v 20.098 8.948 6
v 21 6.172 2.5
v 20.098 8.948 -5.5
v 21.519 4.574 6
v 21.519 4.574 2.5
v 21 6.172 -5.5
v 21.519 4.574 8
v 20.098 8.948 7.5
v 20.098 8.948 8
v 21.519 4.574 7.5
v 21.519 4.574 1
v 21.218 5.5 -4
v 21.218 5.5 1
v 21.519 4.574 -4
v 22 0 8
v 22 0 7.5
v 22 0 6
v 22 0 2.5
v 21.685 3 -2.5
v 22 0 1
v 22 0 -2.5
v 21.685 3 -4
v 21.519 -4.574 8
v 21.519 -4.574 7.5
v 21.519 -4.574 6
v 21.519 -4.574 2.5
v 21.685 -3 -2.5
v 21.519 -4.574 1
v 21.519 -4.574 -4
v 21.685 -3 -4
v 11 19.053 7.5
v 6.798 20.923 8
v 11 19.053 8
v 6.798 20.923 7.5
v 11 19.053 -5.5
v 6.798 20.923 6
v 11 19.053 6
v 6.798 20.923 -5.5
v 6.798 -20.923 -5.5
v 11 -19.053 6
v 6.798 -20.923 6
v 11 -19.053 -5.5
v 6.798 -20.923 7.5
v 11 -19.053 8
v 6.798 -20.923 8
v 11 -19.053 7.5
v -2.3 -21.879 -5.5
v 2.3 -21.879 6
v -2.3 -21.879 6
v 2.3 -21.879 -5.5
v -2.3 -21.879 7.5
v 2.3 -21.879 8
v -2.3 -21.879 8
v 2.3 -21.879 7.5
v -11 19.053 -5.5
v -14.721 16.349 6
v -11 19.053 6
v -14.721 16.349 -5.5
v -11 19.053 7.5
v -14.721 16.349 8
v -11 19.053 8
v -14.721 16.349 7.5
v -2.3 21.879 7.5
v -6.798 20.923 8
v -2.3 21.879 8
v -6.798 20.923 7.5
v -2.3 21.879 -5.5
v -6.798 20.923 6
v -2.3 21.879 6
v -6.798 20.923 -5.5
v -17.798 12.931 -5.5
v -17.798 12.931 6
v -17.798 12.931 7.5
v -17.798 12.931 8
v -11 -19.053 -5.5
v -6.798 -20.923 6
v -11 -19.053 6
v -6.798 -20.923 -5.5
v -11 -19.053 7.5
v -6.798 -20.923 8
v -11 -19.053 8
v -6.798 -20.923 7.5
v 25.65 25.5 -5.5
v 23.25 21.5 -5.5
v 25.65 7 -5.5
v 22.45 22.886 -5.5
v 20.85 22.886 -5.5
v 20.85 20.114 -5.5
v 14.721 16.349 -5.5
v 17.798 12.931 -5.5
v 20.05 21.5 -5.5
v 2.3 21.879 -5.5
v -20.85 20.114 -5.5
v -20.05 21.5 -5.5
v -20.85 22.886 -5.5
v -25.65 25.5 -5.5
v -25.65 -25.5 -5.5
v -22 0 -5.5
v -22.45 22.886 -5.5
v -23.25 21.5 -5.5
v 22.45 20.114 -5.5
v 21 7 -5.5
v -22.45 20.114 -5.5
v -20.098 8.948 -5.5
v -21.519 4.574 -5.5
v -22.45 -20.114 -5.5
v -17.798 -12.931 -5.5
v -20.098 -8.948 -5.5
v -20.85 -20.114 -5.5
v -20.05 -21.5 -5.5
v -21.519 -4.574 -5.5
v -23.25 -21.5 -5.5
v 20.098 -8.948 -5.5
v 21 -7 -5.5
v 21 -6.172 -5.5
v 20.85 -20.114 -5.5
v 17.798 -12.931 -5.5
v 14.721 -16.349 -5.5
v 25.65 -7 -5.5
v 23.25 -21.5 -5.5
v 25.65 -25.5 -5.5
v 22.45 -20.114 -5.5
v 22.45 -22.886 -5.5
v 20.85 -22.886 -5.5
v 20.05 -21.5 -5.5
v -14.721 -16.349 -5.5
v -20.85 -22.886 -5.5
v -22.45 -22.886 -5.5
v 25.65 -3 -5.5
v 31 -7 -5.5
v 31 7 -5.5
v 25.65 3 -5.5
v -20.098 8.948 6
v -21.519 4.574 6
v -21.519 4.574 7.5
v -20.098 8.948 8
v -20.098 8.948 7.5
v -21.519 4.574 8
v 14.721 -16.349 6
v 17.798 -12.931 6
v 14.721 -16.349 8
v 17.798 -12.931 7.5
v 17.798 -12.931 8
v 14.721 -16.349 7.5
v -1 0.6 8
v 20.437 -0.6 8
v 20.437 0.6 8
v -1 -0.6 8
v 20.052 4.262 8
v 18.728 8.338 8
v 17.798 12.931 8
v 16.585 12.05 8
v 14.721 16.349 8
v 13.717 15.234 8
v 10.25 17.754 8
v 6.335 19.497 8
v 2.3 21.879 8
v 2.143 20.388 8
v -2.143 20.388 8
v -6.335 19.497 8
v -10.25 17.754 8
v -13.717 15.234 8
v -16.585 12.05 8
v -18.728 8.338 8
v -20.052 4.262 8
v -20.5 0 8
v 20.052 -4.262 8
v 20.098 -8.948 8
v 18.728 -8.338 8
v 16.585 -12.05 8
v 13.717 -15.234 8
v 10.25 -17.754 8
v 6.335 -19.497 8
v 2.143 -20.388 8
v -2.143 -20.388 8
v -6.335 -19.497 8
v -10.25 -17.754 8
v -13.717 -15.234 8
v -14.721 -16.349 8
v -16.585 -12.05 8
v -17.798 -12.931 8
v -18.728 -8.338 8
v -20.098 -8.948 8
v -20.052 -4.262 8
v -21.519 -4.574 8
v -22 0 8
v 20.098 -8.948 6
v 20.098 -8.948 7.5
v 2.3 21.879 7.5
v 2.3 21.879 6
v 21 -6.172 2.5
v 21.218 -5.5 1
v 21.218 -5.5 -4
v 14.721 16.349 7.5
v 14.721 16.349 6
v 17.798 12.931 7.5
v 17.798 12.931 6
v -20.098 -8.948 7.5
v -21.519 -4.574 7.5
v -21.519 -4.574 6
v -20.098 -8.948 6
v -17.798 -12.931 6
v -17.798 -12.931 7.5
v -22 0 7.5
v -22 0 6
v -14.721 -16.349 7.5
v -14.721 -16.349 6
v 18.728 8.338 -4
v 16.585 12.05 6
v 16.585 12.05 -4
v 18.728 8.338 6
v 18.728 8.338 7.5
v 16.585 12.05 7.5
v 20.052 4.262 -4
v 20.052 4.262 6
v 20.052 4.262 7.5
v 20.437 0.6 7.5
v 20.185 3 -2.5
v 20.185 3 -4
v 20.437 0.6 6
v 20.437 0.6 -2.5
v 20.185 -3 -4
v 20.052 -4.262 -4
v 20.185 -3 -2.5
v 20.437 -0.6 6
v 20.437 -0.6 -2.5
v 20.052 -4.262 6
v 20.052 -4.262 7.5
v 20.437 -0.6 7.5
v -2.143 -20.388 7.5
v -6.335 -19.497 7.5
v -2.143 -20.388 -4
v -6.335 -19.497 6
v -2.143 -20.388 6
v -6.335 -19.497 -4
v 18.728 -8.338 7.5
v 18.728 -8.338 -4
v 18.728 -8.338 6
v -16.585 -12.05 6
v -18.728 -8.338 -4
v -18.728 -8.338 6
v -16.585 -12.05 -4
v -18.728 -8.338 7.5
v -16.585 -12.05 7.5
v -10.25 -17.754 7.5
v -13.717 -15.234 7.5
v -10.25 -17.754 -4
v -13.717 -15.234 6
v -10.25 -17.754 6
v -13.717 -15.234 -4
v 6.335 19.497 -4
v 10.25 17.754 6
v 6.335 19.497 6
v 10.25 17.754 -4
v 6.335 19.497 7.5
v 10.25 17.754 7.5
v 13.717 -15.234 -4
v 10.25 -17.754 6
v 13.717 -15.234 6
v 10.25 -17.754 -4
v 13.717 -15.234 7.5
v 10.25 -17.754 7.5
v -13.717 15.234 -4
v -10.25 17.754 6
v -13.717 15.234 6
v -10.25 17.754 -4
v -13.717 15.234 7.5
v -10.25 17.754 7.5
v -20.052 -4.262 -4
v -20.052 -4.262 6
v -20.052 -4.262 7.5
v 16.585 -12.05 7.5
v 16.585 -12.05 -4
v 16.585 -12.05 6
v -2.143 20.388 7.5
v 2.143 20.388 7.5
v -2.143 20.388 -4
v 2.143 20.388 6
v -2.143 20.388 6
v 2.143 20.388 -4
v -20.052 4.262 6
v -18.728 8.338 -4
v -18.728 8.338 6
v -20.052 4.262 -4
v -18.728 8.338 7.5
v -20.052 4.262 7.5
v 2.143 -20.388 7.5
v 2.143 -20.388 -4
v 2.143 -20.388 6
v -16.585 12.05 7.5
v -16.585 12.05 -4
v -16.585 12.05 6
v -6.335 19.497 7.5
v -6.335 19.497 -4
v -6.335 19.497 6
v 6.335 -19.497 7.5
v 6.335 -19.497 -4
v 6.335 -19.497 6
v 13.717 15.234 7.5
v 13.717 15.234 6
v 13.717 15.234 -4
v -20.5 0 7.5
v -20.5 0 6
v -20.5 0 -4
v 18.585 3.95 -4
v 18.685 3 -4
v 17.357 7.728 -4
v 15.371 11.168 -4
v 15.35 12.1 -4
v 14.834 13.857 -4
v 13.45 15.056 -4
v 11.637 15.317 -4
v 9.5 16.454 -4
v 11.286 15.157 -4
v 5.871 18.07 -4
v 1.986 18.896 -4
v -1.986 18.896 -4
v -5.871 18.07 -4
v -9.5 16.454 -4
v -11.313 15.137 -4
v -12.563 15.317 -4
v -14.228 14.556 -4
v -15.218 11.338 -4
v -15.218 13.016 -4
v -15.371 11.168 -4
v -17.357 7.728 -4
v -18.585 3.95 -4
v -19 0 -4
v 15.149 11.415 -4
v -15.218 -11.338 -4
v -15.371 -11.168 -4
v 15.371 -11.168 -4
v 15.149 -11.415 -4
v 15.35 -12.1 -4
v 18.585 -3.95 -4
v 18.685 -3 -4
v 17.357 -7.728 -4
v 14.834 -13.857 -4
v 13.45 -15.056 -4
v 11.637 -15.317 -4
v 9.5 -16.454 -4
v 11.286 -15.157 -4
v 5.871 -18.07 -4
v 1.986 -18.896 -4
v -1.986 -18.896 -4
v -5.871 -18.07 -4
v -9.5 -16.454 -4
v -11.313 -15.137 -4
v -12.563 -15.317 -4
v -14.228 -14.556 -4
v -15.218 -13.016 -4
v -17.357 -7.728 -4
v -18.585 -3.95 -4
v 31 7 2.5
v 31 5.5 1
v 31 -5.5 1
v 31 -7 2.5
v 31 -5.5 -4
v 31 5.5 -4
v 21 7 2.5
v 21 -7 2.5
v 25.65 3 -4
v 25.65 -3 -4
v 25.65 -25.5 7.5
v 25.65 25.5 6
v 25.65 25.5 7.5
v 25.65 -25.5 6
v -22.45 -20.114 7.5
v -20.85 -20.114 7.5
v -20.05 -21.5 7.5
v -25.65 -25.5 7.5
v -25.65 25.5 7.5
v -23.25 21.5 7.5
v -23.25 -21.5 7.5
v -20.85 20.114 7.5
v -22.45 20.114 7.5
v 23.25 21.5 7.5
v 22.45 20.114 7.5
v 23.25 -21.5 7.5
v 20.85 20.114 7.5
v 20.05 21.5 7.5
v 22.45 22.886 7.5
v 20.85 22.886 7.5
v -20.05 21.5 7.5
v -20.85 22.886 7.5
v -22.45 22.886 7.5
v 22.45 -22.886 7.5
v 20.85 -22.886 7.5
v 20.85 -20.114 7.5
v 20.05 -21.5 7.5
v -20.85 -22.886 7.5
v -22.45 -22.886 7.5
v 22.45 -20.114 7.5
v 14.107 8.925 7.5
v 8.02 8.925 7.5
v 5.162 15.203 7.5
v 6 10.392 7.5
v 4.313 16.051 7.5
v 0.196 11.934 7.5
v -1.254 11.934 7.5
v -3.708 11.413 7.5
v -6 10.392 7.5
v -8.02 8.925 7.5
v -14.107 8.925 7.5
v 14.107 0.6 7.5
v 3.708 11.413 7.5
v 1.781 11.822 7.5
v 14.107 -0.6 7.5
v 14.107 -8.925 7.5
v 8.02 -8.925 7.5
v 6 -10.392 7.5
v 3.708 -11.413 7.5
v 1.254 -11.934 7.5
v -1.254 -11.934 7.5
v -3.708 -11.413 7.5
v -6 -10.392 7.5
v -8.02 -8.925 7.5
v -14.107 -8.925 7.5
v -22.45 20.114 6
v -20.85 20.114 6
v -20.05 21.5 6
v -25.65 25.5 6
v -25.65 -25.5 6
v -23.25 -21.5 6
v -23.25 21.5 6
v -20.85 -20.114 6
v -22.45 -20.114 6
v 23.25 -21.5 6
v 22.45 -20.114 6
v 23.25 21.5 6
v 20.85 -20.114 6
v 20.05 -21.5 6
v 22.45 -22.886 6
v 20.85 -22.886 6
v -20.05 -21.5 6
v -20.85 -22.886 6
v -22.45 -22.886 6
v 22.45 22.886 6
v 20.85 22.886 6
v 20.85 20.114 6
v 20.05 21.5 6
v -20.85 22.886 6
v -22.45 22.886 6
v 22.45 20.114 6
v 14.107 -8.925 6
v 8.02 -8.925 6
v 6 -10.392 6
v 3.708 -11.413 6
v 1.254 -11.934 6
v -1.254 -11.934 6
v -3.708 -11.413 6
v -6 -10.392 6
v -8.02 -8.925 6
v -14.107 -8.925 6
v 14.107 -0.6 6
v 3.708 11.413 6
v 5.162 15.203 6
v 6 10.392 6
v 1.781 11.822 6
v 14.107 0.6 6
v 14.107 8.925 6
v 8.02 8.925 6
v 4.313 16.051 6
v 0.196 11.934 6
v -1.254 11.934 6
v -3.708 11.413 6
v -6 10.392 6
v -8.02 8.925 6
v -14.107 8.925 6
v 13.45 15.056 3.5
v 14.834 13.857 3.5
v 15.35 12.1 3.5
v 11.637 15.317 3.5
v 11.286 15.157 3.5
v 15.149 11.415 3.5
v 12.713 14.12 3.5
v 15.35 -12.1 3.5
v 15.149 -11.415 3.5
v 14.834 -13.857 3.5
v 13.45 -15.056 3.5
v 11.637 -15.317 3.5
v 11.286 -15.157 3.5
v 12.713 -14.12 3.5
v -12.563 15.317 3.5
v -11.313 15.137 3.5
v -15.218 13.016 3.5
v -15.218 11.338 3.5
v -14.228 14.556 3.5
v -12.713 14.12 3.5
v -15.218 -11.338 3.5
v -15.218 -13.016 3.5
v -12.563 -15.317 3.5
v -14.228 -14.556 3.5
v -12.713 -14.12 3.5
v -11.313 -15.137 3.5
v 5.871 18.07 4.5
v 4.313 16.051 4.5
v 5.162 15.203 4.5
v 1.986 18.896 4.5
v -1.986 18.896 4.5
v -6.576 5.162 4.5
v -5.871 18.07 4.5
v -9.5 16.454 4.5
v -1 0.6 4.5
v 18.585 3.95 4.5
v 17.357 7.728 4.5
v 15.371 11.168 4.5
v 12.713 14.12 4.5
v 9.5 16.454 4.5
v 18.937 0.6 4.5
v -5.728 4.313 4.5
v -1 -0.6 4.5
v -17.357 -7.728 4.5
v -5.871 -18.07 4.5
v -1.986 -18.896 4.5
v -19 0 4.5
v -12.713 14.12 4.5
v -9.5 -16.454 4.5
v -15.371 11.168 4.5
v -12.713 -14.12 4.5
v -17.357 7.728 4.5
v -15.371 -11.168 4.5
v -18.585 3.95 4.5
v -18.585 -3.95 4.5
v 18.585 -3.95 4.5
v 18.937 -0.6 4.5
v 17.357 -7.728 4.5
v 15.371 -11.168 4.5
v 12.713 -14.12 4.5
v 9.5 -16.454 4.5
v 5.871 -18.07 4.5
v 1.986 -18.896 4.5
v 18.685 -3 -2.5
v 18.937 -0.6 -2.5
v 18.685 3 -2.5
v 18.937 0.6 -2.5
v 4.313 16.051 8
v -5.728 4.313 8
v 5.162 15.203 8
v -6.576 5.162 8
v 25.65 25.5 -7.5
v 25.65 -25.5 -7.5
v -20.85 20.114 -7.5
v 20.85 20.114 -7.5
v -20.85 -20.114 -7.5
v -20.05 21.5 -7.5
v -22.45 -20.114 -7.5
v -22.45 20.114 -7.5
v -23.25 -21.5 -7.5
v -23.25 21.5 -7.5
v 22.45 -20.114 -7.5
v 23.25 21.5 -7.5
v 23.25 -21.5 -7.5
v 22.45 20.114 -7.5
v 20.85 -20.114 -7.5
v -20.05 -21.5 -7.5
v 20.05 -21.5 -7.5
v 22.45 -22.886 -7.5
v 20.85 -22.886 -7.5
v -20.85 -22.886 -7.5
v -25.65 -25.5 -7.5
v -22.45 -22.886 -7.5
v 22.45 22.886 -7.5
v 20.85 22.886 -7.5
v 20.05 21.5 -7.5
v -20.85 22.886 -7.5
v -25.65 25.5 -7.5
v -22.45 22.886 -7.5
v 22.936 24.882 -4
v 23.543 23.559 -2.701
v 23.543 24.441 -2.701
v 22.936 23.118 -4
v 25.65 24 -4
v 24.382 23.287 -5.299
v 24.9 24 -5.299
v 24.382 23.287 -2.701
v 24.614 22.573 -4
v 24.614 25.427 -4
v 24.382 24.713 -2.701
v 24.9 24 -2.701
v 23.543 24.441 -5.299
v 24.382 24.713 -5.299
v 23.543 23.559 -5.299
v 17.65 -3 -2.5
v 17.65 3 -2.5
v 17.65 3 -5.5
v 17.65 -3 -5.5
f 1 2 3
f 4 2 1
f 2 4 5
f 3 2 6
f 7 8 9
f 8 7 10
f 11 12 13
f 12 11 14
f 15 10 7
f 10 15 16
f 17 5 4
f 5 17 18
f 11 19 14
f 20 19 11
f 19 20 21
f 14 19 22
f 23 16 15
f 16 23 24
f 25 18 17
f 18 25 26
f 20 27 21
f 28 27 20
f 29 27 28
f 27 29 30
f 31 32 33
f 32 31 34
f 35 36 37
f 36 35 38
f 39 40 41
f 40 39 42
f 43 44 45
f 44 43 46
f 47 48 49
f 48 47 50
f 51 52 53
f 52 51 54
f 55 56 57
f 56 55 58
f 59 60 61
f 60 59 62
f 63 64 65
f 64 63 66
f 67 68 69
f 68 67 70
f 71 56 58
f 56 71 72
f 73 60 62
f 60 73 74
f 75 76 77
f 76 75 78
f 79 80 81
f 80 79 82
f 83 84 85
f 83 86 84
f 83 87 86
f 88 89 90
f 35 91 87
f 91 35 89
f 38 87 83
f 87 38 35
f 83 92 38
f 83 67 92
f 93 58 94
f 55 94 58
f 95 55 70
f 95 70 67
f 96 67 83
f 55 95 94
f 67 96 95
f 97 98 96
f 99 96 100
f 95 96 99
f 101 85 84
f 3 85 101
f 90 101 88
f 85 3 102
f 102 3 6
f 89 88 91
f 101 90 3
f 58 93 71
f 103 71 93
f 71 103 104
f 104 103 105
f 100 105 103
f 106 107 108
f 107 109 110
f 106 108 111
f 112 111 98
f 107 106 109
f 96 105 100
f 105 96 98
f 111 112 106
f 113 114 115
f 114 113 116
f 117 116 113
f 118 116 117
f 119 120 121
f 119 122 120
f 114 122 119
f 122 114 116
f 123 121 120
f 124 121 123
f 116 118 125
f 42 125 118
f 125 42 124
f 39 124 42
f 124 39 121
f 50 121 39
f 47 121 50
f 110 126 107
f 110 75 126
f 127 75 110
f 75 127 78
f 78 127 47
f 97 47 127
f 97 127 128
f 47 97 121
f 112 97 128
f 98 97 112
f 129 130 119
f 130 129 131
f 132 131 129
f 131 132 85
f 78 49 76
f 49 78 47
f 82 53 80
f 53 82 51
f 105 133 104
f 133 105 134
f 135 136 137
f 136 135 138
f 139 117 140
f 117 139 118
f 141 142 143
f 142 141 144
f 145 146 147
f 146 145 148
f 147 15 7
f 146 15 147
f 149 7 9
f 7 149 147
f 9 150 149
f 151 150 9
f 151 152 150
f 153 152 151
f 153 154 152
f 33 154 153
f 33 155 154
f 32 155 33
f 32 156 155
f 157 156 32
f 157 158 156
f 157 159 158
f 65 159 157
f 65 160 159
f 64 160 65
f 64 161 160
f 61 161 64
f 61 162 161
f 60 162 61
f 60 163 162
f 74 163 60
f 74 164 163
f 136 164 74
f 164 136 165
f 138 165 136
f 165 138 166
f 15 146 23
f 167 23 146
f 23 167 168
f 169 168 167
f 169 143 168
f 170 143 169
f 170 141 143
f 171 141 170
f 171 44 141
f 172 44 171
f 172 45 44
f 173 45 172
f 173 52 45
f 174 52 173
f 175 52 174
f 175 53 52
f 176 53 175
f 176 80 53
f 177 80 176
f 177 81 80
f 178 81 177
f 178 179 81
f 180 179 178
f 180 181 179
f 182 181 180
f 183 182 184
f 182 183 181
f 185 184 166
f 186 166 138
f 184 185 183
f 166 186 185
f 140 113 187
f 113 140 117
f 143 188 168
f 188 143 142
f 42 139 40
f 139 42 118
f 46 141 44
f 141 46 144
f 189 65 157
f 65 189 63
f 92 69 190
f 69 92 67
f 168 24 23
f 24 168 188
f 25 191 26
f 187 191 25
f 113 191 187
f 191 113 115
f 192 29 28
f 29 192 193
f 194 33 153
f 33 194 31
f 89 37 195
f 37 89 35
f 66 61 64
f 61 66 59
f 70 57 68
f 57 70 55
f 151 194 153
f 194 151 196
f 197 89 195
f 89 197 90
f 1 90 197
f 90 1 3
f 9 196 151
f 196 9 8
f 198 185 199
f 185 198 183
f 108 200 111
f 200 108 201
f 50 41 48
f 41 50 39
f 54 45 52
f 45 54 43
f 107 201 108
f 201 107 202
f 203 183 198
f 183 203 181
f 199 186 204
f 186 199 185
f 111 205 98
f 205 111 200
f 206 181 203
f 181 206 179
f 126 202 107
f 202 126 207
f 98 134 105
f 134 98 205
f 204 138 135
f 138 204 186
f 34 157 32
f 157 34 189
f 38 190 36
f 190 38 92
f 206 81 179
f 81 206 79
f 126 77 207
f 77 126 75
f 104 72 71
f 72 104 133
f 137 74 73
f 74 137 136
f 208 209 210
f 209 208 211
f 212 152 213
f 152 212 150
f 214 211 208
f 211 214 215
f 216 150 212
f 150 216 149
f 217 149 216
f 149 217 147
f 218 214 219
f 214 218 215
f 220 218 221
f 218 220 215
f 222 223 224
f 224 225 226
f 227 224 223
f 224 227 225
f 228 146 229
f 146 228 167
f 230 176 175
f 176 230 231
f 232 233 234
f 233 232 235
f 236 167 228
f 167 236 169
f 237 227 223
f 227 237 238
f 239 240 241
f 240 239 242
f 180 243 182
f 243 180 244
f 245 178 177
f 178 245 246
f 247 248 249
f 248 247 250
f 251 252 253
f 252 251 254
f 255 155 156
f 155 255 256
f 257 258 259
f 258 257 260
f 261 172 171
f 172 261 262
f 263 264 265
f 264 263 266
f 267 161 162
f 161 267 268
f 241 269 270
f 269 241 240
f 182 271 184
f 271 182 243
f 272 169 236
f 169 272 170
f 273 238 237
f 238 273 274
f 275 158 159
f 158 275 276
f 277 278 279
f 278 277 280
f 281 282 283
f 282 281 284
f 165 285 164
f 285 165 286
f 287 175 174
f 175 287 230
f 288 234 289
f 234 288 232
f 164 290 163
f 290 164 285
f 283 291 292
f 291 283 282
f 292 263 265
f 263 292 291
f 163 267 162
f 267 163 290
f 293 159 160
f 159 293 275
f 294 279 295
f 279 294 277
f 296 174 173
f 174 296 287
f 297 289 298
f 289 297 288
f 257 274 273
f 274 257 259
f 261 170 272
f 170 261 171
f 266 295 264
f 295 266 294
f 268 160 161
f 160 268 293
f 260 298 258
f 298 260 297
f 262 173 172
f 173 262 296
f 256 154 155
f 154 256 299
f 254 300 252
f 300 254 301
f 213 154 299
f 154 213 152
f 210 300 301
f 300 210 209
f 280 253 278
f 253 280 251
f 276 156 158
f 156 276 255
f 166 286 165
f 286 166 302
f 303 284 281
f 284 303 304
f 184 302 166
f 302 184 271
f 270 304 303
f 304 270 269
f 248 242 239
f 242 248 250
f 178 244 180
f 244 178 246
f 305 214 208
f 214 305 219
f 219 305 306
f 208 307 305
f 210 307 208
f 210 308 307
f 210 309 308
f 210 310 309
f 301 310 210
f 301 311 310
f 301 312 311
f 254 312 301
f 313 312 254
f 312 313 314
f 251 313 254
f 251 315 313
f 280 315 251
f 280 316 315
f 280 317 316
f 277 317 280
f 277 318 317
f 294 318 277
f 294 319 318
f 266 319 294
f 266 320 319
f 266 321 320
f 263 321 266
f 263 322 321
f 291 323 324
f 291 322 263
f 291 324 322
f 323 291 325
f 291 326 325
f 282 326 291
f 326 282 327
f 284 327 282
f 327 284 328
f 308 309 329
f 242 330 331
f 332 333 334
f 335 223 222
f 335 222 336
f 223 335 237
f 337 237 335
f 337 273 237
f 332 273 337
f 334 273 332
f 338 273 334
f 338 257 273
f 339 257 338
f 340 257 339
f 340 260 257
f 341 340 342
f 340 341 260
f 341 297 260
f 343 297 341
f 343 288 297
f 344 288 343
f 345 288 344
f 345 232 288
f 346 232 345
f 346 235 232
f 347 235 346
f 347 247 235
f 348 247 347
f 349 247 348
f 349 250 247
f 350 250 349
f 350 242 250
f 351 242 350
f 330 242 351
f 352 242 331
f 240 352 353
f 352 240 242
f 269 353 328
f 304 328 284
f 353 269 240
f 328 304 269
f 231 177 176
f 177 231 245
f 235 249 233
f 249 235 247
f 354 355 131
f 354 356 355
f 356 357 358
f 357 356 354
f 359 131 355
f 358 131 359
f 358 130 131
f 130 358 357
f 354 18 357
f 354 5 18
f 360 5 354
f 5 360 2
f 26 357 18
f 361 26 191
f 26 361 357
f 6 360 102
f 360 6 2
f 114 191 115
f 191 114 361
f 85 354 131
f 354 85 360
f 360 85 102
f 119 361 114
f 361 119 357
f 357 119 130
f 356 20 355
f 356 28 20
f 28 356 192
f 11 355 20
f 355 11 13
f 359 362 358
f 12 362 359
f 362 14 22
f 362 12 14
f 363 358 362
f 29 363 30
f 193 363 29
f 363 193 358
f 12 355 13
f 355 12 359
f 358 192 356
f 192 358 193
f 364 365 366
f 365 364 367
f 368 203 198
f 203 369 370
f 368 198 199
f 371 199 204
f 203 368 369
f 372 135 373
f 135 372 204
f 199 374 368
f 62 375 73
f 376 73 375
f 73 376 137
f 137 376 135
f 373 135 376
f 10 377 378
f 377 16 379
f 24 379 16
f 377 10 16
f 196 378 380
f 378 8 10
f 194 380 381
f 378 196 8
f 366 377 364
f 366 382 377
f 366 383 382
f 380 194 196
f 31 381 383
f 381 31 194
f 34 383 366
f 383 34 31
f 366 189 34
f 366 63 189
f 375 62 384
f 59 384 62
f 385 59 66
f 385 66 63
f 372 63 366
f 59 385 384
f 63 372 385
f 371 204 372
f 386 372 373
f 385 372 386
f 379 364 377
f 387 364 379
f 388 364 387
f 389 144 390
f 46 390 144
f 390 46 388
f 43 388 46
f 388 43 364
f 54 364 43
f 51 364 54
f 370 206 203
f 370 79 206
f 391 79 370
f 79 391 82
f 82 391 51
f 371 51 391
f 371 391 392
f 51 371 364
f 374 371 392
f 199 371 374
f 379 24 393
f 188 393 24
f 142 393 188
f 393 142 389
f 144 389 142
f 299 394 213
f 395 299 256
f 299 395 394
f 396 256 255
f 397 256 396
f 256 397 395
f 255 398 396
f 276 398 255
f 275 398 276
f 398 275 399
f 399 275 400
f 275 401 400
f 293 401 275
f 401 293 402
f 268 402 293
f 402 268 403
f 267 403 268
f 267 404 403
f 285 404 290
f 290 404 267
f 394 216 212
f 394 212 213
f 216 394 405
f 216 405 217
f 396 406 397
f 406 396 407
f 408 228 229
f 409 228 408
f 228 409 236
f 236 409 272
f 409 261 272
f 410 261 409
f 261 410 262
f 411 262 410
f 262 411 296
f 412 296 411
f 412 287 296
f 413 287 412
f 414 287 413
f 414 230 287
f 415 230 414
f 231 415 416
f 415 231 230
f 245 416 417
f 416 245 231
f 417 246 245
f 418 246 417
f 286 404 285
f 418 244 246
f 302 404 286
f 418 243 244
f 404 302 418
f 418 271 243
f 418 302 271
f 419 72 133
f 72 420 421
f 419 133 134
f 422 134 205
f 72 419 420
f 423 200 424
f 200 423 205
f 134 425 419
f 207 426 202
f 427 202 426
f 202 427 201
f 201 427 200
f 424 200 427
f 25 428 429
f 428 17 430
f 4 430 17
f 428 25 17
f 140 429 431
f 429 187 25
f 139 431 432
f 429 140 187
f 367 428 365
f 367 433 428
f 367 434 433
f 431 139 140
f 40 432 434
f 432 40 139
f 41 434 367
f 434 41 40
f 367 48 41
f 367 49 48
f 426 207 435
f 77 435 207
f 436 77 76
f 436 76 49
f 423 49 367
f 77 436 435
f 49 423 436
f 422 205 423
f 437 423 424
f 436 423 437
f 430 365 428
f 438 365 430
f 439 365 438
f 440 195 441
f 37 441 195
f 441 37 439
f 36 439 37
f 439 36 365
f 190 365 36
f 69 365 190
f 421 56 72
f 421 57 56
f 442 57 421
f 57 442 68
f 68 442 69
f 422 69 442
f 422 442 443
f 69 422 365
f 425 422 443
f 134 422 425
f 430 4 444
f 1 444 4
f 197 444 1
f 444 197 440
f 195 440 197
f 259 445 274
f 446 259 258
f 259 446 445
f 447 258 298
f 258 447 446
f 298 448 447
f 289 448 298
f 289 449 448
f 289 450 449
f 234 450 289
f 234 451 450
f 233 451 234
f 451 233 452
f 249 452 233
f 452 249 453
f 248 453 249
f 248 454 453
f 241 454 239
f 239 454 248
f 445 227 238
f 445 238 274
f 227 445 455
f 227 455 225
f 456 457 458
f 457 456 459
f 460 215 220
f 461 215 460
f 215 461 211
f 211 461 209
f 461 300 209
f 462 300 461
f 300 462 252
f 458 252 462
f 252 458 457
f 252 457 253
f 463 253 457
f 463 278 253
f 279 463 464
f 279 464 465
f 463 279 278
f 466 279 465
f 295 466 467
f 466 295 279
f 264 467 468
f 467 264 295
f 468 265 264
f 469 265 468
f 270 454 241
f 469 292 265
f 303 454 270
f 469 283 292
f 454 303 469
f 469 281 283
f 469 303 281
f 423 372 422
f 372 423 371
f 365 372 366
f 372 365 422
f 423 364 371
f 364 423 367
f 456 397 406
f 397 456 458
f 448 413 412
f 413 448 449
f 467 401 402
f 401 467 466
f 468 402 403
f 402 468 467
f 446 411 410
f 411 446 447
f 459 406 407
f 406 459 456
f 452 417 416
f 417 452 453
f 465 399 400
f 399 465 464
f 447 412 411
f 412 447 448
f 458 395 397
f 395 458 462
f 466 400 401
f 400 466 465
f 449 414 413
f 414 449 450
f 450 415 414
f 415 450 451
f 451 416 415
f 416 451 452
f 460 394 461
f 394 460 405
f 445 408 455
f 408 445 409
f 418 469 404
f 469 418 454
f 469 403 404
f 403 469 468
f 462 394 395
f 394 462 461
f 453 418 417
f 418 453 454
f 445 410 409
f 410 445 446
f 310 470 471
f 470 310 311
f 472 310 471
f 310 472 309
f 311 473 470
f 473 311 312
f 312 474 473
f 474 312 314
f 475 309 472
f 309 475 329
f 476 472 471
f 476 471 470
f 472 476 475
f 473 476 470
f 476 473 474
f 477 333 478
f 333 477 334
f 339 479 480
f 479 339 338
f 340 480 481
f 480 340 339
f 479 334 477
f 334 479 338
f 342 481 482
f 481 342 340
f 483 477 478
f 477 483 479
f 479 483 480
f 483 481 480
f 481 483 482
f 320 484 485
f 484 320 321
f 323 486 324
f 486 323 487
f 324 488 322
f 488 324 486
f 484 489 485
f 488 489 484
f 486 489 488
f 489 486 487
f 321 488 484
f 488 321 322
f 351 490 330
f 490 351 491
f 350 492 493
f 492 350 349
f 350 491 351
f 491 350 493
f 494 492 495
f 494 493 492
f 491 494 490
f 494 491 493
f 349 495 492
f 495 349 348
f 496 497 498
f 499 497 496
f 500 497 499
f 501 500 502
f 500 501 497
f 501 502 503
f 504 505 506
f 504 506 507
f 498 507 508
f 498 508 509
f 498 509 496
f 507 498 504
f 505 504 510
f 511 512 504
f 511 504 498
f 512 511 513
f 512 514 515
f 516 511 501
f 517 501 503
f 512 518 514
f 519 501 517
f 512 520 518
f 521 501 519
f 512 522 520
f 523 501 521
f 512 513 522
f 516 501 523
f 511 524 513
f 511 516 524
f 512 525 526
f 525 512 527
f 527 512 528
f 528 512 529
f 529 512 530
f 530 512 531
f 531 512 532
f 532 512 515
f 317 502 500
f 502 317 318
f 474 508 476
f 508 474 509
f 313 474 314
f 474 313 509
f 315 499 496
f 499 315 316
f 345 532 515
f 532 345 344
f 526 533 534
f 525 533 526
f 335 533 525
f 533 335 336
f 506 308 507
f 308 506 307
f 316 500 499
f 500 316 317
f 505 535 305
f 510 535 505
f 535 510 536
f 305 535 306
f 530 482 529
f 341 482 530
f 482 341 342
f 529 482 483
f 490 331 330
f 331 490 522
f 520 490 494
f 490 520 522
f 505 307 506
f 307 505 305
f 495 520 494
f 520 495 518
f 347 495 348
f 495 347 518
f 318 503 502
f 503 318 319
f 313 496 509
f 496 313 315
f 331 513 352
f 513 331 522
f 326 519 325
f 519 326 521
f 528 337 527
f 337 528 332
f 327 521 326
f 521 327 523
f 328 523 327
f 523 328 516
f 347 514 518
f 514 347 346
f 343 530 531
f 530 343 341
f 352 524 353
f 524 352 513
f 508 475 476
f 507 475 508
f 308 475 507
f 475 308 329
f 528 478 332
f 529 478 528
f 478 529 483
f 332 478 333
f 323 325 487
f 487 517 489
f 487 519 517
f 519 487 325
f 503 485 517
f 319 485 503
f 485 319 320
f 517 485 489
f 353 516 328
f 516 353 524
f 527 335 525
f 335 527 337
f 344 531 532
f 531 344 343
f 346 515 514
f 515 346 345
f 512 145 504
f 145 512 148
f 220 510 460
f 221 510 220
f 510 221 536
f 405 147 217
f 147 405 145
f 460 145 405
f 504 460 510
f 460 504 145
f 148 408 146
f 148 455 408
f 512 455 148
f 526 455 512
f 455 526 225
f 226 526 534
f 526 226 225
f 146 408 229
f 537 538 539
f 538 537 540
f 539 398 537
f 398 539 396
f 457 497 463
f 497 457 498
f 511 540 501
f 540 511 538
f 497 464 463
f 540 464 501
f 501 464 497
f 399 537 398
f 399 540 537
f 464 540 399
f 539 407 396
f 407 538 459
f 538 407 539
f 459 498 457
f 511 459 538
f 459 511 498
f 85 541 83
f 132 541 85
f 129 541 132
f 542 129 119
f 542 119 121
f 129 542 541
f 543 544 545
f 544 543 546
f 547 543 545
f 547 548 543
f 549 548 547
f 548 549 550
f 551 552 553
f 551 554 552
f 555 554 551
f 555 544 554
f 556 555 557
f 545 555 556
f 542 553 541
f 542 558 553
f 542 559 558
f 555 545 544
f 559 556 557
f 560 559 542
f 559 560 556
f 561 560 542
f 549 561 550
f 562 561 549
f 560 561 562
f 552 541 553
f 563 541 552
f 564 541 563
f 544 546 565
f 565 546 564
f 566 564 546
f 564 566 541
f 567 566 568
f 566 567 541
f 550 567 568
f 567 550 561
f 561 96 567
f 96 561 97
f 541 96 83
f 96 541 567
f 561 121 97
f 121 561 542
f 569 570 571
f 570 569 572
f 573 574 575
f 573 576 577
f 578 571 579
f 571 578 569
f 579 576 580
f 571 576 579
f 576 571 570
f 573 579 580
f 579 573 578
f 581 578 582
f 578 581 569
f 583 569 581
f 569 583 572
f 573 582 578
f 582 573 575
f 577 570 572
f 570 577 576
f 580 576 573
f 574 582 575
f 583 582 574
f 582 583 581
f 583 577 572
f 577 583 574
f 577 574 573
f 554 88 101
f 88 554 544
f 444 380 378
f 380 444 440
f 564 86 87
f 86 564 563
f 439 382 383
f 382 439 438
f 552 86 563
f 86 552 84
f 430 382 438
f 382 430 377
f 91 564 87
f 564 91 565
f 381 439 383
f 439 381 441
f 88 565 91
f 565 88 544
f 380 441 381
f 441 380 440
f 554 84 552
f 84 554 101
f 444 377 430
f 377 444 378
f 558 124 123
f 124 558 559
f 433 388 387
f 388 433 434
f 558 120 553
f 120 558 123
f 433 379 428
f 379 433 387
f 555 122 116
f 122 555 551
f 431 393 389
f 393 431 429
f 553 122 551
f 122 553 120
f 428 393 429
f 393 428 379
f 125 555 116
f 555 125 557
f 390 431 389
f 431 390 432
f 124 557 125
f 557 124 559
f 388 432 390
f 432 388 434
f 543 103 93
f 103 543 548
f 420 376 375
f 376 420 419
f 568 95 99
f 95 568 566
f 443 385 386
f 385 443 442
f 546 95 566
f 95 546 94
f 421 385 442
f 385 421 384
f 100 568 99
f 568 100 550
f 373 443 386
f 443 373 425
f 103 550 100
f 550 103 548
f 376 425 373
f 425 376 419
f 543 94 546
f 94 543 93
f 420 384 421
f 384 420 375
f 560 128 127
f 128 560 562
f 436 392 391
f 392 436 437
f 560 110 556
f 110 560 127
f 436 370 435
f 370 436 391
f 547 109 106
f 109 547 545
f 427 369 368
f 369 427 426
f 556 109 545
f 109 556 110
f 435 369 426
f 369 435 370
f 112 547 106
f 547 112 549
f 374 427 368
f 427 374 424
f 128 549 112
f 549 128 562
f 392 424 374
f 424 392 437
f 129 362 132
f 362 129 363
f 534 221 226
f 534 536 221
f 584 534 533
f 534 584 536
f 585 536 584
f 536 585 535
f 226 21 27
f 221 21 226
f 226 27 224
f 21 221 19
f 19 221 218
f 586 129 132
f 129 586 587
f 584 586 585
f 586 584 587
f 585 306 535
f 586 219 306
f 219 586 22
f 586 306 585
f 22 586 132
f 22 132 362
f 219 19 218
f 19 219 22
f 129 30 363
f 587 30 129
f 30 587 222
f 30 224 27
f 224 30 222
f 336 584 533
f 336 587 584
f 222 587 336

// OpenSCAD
// Parameters
L = 51.3; //[25.65:102.6:0.1]
W = 51; //[25.5:102:0.1]
H = 15; //[7.5:30:0.1]
wall_t = 1.5; //[0.8:3:0.1]
outlet_w = 14; //[7:28:0.1]
outlet_h = 8; //[4:16:0.1]
outlet_len = 10; //[5:20:0.1]
impeller_od = 38; //[19:76:0.1]
impeller_thk = 10; //[5:20:0.1]
impeller_blades = 9; //[5:16:1]
hub_d = 10; //[5:20:0.1]
hub_h = 10; //[5:20:0.1]
inlet_d = 24; //[12:48:0.1]
cover_t = 1.5; //[0.8:3:0.1]
flange_t = 2; //[1:4:0.1]
mount_hole_d = 3.2; //[2:6.4:0.1]
mount_hole_edge_offset = 4; //[2:8:0.1]
eps = 1; //[0.5:2:0.1]
volute_r = 22; //[11:44:0.1]
volute_h = 13.5; //[7:27:0.1]
boss_d = 6.5; //[4:13:0.1]
boss_h = 10; //[5:20:0.1]
boss_hole_d = 2.6; //[1.6:5.2:0.1]
label_recess_depth = 0.6; //[0.3:1.2:0.1]
wire_slot_w = 6; //[3:12:0.1]
wire_slot_h = 3; //[1.5:6:0.1]
wire_slot_len = 8; //[4:16:0.1]
guide_thk = 1.2; //[0.6:2.4:0.1]
blade_len = 7; //[3.5:14:0.1]
blade_w = 3; //[1.5:6:0.1]

// Base Shapes
module housing_volute_outer() {
  translate([0, 0, -H/2 + flange_t + volute_h/2])
    cylinder(r=volute_r, h=volute_h, center=true);
}

module housing_volute_inner() {
  translate([0, 0, -H/2 + flange_t + wall_t + (volute_h - wall_t)/2])
    cylinder(r=volute_r - wall_t, h=volute_h - wall_t, center=true);
}

module outlet_nozzle_outer() {
  translate([volute_r + outlet_len/2 - eps, 0, -H/2 + flange_t + outlet_h/2])
    cube([outlet_len, outlet_w, outlet_h], center=true);
}

module outlet_nozzle_inner() {
  translate([volute_r + outlet_len/2 - eps, 0, -H/2 + flange_t + wall_t + (outlet_h - 2*wall_t)/2])
    cube([outlet_len + 2*eps, outlet_w - 2*wall_t, outlet_h - 2*wall_t], center=true);
}

module mounting_flange() {
  translate([0, 0, -H/2 + flange_t/2])
    cube([L, W, flange_t], center=true);
}

module top_cover_plate() {
  translate([0, 0, H/2 - cover_t/2])
    cube([L, W, cover_t], center=true);
}

module inlet_opening_cutter() {
  translate([0, 0, H/2 - cover_t/2])
    cylinder(r=inlet_d/2, h=cover_t + 2*eps, center=true);
}

module label_recess_cutter() {
  translate([0, 0, H/2 - (label_recess_depth + eps)/2])
    cube([L*0.55, W*0.35, label_recess_depth + eps], center=true);
}

module wire_exit_slot_cutter() {
  translate([L/2 - wire_slot_len/2, 0, -H/2 + flange_t + wire_slot_h/2])
    cube([wire_slot_len, wire_slot_w, wire_slot_h], center=true);
}

module mount_hole_cyl(pos) {
  translate(pos)
    cylinder(r=mount_hole_d/2, h=H + 2*eps, center=true);
}

module screw_boss(pos) {
  translate(pos)
    cylinder(r=boss_d/2, h=boss_h, center=true);
}

module screw_boss_hole(pos) {
  translate(pos)
    cylinder(r=boss_hole_d/2, h=boss_h + 2*eps, center=true);
}

module motor_hub() {
  translate([0, 0, -H/2 + flange_t + hub_h/2 - eps])
    cylinder(r=hub_d/2, h=hub_h, center=true);
}

module impeller_disk() {
  translate([0, 0, -H/2 + flange_t + impeller_thk/2])
    cylinder(r=impeller_od/2, h=impeller_thk, center=true);
}

module impeller_blade(angle) {
  rotate([0, 0, angle])
    translate([hub_d/2 + blade_len/2 - eps, 0, -H/2 + flange_t + impeller_thk/2])
      cube([blade_len, blade_w, impeller_thk], center=true);
}

module impeller_blade_curvature_detail() {
  translate([0, 0, -H/2 + flange_t + impeller_thk/2])
    rotate_extrude() circle(r=impeller_od/2 - wall_t);
}

module internal_flow_guide_1() {
  translate([volute_r/2 - eps, 0, -H/2 + flange_t + wall_t + (volute_h - wall_t)/2])
    cube([volute_r, guide_thk, volute_h - wall_t], center=true);
}

module internal_flow_guide_2() {
  rotate([0, 0, 45])
    translate([volute_r*0.35 - eps, volute_r*0.35, -H/2 + flange_t + wall_t + (volute_h - wall_t)/2])
      cube([volute_r*0.7, guide_thk, volute_h - wall_t], center=true);
}

module fillets_chamfers_proxy() {
  translate([L/2 - wall_t, W/2 - wall_t, -H/2 + flange_t + wall_t])
    sphere(r=wall_t);
}

// Operations
module housing_shell() {
  difference() {
    housing_volute_outer();
    housing_volute_inner();
  }
}

module outlet_shell() {
  difference() {
    outlet_nozzle_outer();
    outlet_nozzle_inner();
  }
}

module housing_with_outlet() {
  union() {
    housing_shell();
    outlet_shell();
  }
}

module impeller_blades_union() {
  union() {
    for (i = [0:impeller_blades-1])
      impeller_blade(i * 360/impeller_blades);
  }
}

module impeller() {
  union() {
    impeller_disk();
    impeller_blades_union();
    motor_hub();
    impeller_blade_curvature_detail();
  }
}

module cover_with_inlet() {
  difference() {
    top_cover_plate();
    inlet_opening_cutter();
    label_recess_cutter();
  }
}

module bosses_union() {
  union() {
    screw_boss([volute_r*0.55, volute_r*0.55, -H/2 + flange_t + boss_h/2 - eps]);
    screw_boss([volute_r*0.55, -volute_r*0.55, -H/2 + flange_t + boss_h/2 - eps]);
    screw_boss([-volute_r*0.55, volute_r*0.55, -H/2 + flange_t + boss_h/2 - eps]);
    screw_boss([-volute_r*0.55, -volute_r*0.55, -H/2 + flange_t + boss_h/2 - eps]);
  }
}

module bosses_drilled() {
  difference() {
    bosses_union();
    screw_boss_hole([volute_r*0.55, volute_r*0.55, -H/2 + flange_t + boss_h/2 - eps]);
    screw_boss_hole([volute_r*0.55, -volute_r*0.55, -H/2 + flange_t + boss_h/2 - eps]);
    screw_boss_hole([-volute_r*0.55, volute_r*0.55, -H/2 + flange_t + boss_h/2 - eps]);
    screw_boss_hole([-volute_r*0.55, -volute_r*0.55, -H/2 + flange_t + boss_h/2 - eps]);
  }
}

module internal_guides_union() {
  union() {
    internal_flow_guide_1();
    internal_flow_guide_2();
  }
}

module main_solid_pre_holes() {
  union() {
    mounting_flange();
    housing_with_outlet();
    cover_with_inlet();
    bosses_drilled();
    impeller();
    internal_guides_union();
    fillets_chamfers_proxy();
  }
}

module main_solid_with_mount_holes() {
  difference() {
    main_solid_pre_holes();
    mount_hole_cyl([L/2 - mount_hole_edge_offset, W/2 - mount_hole_edge_offset, 0]);
    mount_hole_cyl([L/2 - mount_hole_edge_offset, -W/2 + mount_hole_edge_offset, 0]);
    mount_hole_cyl([-L/2 + mount_hole_edge_offset, W/2 - mount_hole_edge_offset, 0]);
    mount_hole_cyl([-L/2 + mount_hole_edge_offset, -W/2 + mount_hole_edge_offset, 0]);
    wire_exit_slot_cutter();
  }
}

// Final Output
main_solid_with_mount_holes();
